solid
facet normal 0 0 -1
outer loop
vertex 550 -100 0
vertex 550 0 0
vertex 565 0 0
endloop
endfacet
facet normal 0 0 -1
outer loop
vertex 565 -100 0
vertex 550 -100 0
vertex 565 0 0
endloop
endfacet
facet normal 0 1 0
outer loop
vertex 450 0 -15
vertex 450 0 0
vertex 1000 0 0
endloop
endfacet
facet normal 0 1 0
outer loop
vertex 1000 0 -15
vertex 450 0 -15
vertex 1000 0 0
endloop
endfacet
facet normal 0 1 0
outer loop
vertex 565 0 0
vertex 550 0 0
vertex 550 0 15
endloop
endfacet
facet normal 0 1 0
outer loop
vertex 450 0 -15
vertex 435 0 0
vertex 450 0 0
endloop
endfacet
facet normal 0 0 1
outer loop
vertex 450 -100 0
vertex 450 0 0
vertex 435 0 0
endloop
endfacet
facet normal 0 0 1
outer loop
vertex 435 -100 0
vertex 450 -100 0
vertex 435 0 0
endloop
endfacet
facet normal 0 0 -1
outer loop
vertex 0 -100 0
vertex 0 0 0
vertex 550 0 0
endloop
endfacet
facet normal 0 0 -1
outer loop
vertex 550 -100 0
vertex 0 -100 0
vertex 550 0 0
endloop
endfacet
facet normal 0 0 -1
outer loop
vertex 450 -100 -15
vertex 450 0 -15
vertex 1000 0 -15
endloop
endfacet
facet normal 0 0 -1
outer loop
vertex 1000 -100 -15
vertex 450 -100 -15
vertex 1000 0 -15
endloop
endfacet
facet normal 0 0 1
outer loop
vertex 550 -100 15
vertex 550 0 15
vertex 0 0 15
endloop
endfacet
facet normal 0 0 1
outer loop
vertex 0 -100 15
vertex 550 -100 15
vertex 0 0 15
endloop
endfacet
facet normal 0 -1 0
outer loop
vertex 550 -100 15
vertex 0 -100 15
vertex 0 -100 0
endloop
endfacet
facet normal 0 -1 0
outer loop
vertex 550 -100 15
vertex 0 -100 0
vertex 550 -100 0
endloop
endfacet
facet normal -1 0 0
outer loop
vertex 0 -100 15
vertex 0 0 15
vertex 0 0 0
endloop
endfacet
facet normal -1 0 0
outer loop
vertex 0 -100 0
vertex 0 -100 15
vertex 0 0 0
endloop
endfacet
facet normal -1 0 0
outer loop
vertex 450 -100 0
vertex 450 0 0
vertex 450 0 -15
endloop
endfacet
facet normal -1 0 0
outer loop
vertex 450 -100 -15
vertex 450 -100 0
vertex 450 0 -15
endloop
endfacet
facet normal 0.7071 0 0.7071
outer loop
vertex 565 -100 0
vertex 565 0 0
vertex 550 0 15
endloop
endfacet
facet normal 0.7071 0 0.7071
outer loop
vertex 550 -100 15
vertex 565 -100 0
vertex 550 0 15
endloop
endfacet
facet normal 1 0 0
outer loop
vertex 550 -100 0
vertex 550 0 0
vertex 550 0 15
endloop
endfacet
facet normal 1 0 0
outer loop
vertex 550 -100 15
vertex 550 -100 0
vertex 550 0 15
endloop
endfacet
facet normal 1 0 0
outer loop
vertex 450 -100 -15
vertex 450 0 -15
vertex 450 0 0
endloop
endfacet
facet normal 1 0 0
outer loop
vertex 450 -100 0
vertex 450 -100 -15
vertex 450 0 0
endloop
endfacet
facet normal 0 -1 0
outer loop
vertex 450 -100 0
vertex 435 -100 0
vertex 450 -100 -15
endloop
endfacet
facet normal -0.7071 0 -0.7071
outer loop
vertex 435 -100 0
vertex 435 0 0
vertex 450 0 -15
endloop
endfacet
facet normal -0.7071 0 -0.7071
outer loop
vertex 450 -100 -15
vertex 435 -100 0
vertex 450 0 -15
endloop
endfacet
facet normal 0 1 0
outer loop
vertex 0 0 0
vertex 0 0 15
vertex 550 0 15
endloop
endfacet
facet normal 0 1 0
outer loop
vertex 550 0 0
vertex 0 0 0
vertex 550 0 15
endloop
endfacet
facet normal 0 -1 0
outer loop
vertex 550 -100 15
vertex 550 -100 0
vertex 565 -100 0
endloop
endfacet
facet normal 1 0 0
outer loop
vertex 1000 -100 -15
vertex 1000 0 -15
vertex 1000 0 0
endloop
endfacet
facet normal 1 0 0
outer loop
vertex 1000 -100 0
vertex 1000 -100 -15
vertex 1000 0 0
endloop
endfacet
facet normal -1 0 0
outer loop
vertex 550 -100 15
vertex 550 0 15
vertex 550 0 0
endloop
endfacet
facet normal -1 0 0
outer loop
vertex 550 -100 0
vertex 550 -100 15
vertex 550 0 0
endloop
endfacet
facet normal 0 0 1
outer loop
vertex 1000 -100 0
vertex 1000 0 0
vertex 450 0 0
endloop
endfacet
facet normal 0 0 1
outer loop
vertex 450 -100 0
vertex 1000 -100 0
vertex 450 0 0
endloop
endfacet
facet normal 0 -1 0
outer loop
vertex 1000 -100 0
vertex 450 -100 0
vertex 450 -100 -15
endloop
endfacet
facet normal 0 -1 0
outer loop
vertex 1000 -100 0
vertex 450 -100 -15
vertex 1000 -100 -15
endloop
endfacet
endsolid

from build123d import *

# Parameters (mm, degrees)
F2_DEPTH = 100
F3_DEPTH = 100
F4_DEPTH = 100
F5_DEPTH = 100


with BuildPart() as f2:
    # F1 (on Front) → F2 (new body)
    with BuildSketch(Plane.XZ):
        Polygon((0, 15), (0, 0), (435, 0), (450, 0), (550, 0), (550, 15), align=None)
    extrude(amount=F2_DEPTH)


with BuildPart() as f3:
    # F1 (on Front) → F3 (new body)
    with BuildSketch(Plane.XZ):
        Polygon((550, 0), (450, 0), (450, -15), (1000, -15), (1000, 0), (565, 0), align=None)
    extrude(amount=F3_DEPTH)


with BuildPart() as f4:
    # F1 (on Front) → F4 (new body)
    with BuildSketch(Plane.XZ):
        Polygon((565, 0), (550, 15), (550, 0), align=None)
    extrude(amount=F4_DEPTH)


with BuildPart() as f5:
    # F1 (on Front) → F5 (new body)
    with BuildSketch(Plane.XZ):
        Polygon((450, 0), (435, 0), (450, -15), align=None)
    extrude(amount=F5_DEPTH)


solid = Compound([f2.part, f3.part, f4.part, f5.part])
